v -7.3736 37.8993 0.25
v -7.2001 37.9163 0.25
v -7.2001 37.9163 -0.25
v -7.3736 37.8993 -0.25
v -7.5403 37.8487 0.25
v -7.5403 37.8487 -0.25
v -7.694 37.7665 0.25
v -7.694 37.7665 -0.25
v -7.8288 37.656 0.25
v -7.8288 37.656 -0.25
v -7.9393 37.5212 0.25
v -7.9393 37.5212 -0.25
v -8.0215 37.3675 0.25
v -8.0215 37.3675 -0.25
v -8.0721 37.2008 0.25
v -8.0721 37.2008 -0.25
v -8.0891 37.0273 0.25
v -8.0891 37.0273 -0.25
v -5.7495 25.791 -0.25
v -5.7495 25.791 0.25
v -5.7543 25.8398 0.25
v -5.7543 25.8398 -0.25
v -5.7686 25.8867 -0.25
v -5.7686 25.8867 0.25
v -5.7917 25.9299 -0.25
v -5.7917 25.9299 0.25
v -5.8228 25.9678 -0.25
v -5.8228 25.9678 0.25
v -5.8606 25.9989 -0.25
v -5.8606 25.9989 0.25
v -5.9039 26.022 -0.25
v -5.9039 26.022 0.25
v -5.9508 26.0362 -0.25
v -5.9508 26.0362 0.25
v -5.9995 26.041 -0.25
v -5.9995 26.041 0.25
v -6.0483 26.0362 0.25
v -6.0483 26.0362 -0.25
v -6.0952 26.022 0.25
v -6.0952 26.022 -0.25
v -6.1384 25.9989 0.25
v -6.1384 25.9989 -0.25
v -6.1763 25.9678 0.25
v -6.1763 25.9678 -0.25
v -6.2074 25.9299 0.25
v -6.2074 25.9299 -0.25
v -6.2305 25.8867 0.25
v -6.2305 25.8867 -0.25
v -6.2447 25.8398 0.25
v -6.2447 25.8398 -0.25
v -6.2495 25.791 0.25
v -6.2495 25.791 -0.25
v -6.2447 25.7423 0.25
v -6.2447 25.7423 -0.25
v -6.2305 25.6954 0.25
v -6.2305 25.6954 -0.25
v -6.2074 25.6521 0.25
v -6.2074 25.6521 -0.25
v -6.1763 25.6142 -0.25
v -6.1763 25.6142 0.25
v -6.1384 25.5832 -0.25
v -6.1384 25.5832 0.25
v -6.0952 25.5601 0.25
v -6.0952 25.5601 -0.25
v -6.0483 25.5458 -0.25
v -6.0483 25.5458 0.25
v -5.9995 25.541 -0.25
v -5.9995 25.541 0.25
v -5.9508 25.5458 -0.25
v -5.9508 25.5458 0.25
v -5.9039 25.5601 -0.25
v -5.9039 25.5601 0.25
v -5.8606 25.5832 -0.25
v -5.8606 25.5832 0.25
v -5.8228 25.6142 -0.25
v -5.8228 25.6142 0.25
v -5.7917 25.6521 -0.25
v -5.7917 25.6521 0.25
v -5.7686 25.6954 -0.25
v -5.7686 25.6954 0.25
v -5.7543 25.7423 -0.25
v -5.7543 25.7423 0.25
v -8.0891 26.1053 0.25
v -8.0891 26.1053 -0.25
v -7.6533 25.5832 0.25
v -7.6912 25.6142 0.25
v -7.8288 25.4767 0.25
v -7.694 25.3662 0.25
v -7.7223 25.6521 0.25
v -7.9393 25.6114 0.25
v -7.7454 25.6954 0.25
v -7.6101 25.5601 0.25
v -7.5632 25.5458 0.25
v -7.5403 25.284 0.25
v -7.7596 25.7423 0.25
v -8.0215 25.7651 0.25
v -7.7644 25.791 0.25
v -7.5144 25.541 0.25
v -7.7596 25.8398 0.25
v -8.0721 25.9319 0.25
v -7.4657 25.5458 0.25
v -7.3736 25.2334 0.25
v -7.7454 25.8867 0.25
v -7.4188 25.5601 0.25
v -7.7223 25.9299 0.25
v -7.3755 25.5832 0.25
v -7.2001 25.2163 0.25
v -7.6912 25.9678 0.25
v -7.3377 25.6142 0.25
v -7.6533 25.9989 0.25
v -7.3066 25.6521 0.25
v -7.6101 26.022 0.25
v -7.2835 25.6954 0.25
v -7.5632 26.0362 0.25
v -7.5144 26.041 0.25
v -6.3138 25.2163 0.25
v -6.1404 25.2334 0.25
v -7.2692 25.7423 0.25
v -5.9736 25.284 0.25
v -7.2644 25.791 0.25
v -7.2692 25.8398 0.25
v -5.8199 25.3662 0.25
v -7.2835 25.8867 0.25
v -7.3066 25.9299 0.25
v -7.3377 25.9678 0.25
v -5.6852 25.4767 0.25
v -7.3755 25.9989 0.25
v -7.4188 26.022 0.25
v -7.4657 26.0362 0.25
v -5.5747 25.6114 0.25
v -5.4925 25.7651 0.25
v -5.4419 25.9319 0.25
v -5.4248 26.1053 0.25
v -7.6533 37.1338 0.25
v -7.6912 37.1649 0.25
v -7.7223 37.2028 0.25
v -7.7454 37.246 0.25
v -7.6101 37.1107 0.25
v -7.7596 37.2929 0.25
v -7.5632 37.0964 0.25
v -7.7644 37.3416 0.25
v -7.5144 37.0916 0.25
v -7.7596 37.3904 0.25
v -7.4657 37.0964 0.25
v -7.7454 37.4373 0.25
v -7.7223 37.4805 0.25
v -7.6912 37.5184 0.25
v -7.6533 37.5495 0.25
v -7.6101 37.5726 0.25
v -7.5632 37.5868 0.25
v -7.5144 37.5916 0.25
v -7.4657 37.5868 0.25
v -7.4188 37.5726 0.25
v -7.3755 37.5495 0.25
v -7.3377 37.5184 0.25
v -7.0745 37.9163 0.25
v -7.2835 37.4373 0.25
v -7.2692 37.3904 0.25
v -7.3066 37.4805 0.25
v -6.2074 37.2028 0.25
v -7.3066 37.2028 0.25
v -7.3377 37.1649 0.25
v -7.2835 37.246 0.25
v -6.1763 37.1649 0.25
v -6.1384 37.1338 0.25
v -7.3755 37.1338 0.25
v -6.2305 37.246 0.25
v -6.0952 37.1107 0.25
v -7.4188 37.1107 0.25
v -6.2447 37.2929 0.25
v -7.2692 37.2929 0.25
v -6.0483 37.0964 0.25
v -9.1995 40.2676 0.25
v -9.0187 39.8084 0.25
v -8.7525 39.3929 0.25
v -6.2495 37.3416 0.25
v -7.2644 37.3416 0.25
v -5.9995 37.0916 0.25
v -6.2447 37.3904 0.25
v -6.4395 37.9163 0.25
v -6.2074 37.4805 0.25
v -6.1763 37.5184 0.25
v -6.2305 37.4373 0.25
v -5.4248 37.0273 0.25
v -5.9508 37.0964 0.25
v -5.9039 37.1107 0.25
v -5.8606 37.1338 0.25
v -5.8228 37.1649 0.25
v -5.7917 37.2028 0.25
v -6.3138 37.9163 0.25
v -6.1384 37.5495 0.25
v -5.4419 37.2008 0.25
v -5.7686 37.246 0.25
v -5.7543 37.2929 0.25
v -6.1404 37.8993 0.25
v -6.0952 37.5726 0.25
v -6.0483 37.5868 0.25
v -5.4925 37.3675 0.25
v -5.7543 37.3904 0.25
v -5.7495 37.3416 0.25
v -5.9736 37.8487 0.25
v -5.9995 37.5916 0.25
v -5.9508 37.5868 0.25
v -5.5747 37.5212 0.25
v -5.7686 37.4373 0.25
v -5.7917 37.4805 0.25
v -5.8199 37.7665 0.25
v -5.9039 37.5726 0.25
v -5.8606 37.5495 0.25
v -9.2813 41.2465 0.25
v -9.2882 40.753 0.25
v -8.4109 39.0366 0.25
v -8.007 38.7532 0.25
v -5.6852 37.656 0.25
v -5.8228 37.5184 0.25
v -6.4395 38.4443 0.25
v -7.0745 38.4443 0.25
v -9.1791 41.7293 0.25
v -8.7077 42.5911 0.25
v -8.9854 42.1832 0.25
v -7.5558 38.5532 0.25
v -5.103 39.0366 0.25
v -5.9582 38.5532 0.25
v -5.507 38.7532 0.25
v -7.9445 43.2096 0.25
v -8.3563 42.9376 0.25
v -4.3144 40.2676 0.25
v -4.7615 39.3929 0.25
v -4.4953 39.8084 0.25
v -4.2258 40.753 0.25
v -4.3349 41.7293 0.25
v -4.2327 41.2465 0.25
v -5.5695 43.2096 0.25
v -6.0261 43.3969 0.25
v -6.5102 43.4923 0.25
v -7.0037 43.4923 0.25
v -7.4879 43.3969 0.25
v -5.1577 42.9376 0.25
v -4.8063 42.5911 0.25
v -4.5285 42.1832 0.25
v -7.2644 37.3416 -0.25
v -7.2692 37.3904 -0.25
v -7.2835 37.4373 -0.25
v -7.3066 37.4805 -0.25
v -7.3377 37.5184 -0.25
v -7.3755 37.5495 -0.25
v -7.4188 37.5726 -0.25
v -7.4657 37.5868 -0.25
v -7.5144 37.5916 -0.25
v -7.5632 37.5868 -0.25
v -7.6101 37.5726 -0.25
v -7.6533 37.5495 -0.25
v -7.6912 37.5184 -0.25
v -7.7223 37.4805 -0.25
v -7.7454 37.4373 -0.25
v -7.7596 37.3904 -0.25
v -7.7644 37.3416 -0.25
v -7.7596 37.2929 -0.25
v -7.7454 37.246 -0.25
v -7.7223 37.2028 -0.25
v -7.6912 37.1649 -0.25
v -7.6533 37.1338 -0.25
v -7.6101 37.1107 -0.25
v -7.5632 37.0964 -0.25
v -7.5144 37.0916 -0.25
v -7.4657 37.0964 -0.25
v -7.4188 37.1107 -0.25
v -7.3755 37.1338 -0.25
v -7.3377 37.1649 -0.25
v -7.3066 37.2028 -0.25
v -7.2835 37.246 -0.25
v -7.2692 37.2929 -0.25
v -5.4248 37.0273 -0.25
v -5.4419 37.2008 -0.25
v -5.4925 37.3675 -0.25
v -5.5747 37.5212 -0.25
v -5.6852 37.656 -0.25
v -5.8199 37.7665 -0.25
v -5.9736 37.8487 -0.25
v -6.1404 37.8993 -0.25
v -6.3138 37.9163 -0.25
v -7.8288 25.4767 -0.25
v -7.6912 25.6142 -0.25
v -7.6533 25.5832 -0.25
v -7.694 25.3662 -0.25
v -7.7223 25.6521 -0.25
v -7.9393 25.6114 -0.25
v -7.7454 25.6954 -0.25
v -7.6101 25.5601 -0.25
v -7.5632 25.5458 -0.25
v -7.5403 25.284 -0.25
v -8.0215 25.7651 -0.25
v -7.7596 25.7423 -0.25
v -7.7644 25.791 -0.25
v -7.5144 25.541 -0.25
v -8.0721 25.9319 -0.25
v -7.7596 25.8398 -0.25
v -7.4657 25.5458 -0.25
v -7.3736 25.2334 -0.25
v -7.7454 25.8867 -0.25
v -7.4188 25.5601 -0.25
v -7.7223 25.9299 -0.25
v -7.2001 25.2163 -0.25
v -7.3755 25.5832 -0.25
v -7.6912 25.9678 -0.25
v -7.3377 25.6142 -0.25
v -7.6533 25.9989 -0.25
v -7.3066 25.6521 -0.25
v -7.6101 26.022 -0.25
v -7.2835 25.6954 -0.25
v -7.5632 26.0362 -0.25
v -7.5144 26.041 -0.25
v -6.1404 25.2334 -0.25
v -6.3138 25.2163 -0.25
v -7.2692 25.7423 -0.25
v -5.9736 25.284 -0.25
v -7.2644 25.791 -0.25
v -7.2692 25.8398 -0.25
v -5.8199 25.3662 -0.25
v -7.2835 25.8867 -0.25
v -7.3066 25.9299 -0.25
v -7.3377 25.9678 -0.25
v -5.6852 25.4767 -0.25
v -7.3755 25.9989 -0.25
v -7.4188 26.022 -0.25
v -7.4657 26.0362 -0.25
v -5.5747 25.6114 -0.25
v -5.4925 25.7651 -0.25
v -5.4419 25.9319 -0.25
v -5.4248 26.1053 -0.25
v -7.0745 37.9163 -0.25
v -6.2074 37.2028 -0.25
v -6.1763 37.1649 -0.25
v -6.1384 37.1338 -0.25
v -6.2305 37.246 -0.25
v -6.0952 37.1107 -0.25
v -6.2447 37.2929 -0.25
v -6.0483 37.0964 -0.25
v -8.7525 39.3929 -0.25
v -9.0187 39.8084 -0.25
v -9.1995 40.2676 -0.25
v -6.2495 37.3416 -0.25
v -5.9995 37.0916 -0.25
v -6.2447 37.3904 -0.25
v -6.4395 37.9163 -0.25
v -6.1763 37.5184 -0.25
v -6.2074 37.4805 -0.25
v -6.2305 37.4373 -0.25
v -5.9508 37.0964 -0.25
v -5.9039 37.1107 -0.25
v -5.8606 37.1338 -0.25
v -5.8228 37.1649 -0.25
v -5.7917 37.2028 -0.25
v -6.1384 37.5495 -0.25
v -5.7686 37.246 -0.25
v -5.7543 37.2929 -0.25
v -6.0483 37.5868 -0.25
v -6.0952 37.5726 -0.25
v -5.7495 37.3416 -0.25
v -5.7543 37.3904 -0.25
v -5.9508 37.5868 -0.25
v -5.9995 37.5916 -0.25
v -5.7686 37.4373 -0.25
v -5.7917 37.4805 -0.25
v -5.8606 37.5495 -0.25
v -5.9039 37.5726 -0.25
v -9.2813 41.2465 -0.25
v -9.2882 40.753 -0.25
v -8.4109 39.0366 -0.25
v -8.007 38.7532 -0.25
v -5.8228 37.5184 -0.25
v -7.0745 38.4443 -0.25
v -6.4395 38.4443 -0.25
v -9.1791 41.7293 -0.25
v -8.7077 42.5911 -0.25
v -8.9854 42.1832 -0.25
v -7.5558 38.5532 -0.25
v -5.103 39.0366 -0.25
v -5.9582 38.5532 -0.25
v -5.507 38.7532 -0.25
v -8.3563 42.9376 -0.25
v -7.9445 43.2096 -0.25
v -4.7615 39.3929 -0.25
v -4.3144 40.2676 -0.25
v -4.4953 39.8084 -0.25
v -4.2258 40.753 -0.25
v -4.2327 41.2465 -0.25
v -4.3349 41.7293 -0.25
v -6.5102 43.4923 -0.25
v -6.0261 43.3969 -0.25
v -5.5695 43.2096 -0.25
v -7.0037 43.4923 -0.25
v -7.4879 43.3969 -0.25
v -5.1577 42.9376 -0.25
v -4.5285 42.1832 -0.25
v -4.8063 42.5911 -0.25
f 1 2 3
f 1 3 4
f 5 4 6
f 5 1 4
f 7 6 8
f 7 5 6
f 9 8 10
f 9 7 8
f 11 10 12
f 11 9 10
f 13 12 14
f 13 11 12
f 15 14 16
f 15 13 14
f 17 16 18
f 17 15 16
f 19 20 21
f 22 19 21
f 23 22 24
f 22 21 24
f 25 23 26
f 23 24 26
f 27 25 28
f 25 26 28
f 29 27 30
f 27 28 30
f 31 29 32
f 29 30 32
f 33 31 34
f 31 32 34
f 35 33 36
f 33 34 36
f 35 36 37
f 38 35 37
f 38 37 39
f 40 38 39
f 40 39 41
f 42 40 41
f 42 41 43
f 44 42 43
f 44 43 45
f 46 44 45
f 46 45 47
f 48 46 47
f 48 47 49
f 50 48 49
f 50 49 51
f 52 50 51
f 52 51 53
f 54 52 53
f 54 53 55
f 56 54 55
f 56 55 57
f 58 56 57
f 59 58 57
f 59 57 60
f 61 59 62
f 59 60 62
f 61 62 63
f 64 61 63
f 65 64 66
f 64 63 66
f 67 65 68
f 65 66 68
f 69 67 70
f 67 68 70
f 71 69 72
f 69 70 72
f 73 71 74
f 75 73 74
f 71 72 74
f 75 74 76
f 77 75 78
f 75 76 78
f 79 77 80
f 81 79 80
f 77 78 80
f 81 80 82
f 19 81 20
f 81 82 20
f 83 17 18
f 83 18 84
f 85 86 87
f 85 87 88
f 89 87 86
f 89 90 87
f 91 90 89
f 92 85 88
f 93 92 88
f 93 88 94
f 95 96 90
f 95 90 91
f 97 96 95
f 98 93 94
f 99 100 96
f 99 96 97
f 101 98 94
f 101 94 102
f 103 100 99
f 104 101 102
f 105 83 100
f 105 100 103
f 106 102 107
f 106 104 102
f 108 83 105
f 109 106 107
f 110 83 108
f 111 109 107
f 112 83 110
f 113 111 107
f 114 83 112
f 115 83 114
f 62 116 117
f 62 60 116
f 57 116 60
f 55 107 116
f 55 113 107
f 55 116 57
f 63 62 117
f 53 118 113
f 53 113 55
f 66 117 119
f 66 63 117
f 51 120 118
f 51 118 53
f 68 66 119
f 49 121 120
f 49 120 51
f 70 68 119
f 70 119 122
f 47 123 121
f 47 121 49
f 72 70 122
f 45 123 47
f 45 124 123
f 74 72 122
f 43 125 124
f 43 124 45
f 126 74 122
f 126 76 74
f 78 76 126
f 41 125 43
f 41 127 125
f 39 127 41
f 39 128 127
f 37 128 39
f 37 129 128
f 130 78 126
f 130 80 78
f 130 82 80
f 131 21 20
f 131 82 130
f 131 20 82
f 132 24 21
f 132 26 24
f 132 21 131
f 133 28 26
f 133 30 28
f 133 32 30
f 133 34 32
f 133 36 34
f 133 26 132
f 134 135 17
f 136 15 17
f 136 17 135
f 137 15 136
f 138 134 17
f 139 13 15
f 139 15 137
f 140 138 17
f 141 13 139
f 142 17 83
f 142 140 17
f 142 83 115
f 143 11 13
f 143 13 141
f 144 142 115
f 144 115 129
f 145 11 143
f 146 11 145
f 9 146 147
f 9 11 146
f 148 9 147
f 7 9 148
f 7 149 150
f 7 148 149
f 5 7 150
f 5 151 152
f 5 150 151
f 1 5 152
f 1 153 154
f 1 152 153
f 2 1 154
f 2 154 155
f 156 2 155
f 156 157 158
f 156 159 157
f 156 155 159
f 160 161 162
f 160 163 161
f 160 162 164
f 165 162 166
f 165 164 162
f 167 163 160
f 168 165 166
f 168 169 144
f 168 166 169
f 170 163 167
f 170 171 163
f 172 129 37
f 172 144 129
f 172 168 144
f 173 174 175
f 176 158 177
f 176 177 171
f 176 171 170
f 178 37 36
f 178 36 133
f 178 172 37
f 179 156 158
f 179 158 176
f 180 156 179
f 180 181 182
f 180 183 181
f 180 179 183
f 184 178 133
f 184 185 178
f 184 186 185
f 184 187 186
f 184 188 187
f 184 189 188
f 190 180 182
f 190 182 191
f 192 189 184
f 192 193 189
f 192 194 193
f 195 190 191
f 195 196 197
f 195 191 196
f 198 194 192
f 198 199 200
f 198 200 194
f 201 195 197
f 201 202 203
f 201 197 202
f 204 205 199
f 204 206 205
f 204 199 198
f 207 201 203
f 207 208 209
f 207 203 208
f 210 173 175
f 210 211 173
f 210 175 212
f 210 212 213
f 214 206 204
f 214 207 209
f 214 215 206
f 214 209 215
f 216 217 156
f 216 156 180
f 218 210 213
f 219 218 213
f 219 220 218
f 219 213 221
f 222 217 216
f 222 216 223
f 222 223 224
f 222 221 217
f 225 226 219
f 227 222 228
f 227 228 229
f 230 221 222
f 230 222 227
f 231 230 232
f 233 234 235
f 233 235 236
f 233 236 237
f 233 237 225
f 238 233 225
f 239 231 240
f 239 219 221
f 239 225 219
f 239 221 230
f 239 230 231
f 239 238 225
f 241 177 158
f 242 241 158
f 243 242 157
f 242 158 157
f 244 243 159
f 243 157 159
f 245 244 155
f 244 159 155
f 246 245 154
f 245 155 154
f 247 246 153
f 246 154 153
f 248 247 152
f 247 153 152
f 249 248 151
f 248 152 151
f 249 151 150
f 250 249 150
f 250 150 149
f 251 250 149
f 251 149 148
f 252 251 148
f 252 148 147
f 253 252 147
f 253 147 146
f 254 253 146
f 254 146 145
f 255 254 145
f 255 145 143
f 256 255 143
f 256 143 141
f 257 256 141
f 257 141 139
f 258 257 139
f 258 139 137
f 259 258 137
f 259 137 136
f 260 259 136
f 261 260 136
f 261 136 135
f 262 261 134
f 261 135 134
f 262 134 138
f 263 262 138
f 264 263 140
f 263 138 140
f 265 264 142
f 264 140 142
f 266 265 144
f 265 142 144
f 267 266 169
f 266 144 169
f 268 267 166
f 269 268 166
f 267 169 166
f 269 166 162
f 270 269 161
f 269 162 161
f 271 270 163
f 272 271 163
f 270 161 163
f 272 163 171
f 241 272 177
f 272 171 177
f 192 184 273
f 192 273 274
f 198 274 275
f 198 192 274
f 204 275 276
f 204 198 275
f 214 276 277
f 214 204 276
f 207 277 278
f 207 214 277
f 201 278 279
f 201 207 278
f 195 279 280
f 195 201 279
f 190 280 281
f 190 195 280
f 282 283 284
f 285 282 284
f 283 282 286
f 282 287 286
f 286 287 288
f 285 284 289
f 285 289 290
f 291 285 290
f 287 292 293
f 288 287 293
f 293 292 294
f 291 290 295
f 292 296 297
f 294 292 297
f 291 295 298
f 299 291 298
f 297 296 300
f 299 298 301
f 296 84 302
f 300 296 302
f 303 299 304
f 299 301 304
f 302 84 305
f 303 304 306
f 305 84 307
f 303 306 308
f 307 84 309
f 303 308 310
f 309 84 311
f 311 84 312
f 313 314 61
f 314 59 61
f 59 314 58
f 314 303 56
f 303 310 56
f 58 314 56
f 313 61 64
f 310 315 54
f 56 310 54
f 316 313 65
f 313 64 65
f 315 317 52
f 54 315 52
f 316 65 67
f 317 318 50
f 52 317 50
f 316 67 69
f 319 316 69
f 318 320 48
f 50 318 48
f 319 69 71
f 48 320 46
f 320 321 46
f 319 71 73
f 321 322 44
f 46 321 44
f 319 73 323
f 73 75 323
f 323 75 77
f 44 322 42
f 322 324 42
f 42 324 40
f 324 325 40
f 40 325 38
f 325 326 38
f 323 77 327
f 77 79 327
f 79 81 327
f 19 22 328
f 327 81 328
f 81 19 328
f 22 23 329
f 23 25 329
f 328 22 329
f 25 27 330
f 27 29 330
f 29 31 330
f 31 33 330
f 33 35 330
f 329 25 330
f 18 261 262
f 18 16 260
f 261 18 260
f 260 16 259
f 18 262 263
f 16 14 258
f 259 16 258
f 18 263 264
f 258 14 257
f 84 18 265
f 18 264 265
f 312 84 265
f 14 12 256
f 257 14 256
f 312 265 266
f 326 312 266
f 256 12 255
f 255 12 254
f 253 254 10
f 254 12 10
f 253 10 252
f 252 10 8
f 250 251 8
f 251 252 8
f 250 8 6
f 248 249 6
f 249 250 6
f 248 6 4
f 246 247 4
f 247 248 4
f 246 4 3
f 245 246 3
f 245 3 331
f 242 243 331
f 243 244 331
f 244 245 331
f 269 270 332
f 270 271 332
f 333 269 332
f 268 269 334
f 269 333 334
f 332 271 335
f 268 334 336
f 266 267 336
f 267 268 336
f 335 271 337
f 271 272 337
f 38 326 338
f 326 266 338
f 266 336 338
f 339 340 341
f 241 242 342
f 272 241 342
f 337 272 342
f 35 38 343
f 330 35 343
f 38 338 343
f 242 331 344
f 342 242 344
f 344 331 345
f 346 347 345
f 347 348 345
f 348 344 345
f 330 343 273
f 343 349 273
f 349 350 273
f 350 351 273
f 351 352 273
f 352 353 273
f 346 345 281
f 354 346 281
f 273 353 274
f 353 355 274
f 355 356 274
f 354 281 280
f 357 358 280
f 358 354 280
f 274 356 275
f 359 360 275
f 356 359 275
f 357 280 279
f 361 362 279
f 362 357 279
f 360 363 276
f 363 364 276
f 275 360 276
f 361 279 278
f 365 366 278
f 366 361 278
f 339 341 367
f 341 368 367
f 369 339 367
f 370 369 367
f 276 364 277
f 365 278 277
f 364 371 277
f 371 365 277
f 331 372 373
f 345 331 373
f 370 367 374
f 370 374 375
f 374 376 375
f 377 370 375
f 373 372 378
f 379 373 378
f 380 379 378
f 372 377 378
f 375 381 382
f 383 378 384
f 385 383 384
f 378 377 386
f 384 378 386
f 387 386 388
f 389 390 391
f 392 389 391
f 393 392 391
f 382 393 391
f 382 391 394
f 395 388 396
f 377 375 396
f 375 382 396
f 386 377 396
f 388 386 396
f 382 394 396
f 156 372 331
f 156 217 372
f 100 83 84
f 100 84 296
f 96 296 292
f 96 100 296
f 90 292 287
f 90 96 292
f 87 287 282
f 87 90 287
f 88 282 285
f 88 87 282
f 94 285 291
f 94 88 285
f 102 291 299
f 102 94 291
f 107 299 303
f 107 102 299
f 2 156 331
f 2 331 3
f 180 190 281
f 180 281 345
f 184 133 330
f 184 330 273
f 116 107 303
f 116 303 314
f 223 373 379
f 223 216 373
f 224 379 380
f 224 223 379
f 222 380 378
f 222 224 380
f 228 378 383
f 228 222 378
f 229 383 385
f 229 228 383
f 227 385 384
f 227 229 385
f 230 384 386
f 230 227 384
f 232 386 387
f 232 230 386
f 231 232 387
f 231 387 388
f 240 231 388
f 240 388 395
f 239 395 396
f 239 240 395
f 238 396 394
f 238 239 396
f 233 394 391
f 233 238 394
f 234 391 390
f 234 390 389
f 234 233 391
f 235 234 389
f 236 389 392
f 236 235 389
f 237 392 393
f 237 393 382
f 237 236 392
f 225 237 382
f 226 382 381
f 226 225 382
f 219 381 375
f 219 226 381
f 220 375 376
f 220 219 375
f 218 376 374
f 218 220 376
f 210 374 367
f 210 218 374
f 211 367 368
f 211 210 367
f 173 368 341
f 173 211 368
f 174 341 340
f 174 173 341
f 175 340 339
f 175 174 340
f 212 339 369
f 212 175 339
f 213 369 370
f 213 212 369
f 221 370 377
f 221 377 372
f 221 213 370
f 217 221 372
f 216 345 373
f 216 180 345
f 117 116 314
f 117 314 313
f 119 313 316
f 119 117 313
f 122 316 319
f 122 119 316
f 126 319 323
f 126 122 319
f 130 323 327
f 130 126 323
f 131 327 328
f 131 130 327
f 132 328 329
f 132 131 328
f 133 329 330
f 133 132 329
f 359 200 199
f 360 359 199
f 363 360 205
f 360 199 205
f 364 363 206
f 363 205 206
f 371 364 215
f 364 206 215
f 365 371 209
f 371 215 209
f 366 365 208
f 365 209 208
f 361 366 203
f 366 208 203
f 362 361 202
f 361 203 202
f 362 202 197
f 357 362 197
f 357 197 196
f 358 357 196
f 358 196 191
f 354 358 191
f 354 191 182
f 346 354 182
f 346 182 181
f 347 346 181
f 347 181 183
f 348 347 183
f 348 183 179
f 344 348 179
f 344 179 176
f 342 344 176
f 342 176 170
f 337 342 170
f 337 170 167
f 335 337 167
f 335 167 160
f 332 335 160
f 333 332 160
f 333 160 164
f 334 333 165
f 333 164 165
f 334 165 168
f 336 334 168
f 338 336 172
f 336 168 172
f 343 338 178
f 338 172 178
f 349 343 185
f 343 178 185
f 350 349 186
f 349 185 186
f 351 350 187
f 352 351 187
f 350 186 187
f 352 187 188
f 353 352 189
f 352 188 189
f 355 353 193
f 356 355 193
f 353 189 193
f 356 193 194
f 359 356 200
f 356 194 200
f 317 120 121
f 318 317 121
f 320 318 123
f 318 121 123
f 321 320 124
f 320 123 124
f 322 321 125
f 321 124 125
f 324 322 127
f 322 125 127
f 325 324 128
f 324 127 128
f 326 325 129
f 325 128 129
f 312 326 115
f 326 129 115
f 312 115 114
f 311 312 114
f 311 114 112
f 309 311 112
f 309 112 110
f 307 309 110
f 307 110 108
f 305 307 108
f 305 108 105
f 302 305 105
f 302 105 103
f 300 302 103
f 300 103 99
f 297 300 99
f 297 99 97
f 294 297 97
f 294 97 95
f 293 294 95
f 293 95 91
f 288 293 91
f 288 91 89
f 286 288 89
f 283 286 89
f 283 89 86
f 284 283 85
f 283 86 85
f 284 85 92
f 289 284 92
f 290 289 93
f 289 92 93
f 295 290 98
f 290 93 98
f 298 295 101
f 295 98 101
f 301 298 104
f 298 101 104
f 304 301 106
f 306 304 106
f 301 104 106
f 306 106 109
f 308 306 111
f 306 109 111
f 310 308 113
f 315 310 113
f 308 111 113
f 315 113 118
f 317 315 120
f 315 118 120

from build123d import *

# Parameters (mm, degrees)
BOSS_EXTRUDE1_DEPTH = 0.25
SKETCH4_R           = 0.25
CUT_EXTRUDE1_DEPTH  = 9.5


with BuildPart() as part:
    # Sketch2 → Boss-Extrude1 (new, symmetric)
    with BuildSketch(Plane.XY):
        with BuildLine():
            Line((-7.074484682, 38.444256199), (-7.074484682, 37.916334323))
            Line((-7.074484682, 37.916334323), (-7.200133049, 37.916334323))
            ThreePointArc((-7.200133049, 37.916334323), (-7.828750978, 37.655952251), (-8.089133049, 37.027334323))
            Line((-8.089133049, 37.027334323), (-8.089133049, 26.105334323))
            ThreePointArc((-8.089133049, 26.105334323), (-7.828750978, 25.476716394), (-7.200133049, 25.216334323))
            Line((-7.200133049, 25.216334323), (-6.313836315, 25.216334323))
            ThreePointArc((-6.313836315, 25.216334323), (-5.685218387, 25.476716394), (-5.424836315, 26.105334323))
            Line((-5.424836315, 26.105334323), (-5.424836315, 37.027334323))
            ThreePointArc((-5.424836315, 37.027334323), (-5.685218387, 37.655952251), (-6.313836315, 37.916334323))
            Line((-6.313836315, 37.916334323), (-6.439484682, 37.916334323))
            Line((-6.439484682, 37.916334323), (-6.439484682, 38.444256199))
            ThreePointArc((-6.439484682, 38.444256199), (-6.756984682, 43.504334323), (-7.074484682, 38.444256199))
        make_face()
    extrude(amount=BOSS_EXTRUDE1_DEPTH, both=True)

    # Sketch4 → Cut-Extrude1 (cut)
    with BuildSketch(Plane.XY.offset(0.25)):
        with Locations((-7.514442014, 25.791025359)):
            Circle(SKETCH4_R)
        with Locations((-5.999527351, 25.791025359)):
            Circle(SKETCH4_R)
        with Locations((-7.514442014, 37.341643287)):
            Circle(SKETCH4_R)
        with Locations((-5.999527351, 37.341643287)):
            Circle(SKETCH4_R)
    extrude(amount=-CUT_EXTRUDE1_DEPTH, mode=Mode.SUBTRACT)


solid = part.part
